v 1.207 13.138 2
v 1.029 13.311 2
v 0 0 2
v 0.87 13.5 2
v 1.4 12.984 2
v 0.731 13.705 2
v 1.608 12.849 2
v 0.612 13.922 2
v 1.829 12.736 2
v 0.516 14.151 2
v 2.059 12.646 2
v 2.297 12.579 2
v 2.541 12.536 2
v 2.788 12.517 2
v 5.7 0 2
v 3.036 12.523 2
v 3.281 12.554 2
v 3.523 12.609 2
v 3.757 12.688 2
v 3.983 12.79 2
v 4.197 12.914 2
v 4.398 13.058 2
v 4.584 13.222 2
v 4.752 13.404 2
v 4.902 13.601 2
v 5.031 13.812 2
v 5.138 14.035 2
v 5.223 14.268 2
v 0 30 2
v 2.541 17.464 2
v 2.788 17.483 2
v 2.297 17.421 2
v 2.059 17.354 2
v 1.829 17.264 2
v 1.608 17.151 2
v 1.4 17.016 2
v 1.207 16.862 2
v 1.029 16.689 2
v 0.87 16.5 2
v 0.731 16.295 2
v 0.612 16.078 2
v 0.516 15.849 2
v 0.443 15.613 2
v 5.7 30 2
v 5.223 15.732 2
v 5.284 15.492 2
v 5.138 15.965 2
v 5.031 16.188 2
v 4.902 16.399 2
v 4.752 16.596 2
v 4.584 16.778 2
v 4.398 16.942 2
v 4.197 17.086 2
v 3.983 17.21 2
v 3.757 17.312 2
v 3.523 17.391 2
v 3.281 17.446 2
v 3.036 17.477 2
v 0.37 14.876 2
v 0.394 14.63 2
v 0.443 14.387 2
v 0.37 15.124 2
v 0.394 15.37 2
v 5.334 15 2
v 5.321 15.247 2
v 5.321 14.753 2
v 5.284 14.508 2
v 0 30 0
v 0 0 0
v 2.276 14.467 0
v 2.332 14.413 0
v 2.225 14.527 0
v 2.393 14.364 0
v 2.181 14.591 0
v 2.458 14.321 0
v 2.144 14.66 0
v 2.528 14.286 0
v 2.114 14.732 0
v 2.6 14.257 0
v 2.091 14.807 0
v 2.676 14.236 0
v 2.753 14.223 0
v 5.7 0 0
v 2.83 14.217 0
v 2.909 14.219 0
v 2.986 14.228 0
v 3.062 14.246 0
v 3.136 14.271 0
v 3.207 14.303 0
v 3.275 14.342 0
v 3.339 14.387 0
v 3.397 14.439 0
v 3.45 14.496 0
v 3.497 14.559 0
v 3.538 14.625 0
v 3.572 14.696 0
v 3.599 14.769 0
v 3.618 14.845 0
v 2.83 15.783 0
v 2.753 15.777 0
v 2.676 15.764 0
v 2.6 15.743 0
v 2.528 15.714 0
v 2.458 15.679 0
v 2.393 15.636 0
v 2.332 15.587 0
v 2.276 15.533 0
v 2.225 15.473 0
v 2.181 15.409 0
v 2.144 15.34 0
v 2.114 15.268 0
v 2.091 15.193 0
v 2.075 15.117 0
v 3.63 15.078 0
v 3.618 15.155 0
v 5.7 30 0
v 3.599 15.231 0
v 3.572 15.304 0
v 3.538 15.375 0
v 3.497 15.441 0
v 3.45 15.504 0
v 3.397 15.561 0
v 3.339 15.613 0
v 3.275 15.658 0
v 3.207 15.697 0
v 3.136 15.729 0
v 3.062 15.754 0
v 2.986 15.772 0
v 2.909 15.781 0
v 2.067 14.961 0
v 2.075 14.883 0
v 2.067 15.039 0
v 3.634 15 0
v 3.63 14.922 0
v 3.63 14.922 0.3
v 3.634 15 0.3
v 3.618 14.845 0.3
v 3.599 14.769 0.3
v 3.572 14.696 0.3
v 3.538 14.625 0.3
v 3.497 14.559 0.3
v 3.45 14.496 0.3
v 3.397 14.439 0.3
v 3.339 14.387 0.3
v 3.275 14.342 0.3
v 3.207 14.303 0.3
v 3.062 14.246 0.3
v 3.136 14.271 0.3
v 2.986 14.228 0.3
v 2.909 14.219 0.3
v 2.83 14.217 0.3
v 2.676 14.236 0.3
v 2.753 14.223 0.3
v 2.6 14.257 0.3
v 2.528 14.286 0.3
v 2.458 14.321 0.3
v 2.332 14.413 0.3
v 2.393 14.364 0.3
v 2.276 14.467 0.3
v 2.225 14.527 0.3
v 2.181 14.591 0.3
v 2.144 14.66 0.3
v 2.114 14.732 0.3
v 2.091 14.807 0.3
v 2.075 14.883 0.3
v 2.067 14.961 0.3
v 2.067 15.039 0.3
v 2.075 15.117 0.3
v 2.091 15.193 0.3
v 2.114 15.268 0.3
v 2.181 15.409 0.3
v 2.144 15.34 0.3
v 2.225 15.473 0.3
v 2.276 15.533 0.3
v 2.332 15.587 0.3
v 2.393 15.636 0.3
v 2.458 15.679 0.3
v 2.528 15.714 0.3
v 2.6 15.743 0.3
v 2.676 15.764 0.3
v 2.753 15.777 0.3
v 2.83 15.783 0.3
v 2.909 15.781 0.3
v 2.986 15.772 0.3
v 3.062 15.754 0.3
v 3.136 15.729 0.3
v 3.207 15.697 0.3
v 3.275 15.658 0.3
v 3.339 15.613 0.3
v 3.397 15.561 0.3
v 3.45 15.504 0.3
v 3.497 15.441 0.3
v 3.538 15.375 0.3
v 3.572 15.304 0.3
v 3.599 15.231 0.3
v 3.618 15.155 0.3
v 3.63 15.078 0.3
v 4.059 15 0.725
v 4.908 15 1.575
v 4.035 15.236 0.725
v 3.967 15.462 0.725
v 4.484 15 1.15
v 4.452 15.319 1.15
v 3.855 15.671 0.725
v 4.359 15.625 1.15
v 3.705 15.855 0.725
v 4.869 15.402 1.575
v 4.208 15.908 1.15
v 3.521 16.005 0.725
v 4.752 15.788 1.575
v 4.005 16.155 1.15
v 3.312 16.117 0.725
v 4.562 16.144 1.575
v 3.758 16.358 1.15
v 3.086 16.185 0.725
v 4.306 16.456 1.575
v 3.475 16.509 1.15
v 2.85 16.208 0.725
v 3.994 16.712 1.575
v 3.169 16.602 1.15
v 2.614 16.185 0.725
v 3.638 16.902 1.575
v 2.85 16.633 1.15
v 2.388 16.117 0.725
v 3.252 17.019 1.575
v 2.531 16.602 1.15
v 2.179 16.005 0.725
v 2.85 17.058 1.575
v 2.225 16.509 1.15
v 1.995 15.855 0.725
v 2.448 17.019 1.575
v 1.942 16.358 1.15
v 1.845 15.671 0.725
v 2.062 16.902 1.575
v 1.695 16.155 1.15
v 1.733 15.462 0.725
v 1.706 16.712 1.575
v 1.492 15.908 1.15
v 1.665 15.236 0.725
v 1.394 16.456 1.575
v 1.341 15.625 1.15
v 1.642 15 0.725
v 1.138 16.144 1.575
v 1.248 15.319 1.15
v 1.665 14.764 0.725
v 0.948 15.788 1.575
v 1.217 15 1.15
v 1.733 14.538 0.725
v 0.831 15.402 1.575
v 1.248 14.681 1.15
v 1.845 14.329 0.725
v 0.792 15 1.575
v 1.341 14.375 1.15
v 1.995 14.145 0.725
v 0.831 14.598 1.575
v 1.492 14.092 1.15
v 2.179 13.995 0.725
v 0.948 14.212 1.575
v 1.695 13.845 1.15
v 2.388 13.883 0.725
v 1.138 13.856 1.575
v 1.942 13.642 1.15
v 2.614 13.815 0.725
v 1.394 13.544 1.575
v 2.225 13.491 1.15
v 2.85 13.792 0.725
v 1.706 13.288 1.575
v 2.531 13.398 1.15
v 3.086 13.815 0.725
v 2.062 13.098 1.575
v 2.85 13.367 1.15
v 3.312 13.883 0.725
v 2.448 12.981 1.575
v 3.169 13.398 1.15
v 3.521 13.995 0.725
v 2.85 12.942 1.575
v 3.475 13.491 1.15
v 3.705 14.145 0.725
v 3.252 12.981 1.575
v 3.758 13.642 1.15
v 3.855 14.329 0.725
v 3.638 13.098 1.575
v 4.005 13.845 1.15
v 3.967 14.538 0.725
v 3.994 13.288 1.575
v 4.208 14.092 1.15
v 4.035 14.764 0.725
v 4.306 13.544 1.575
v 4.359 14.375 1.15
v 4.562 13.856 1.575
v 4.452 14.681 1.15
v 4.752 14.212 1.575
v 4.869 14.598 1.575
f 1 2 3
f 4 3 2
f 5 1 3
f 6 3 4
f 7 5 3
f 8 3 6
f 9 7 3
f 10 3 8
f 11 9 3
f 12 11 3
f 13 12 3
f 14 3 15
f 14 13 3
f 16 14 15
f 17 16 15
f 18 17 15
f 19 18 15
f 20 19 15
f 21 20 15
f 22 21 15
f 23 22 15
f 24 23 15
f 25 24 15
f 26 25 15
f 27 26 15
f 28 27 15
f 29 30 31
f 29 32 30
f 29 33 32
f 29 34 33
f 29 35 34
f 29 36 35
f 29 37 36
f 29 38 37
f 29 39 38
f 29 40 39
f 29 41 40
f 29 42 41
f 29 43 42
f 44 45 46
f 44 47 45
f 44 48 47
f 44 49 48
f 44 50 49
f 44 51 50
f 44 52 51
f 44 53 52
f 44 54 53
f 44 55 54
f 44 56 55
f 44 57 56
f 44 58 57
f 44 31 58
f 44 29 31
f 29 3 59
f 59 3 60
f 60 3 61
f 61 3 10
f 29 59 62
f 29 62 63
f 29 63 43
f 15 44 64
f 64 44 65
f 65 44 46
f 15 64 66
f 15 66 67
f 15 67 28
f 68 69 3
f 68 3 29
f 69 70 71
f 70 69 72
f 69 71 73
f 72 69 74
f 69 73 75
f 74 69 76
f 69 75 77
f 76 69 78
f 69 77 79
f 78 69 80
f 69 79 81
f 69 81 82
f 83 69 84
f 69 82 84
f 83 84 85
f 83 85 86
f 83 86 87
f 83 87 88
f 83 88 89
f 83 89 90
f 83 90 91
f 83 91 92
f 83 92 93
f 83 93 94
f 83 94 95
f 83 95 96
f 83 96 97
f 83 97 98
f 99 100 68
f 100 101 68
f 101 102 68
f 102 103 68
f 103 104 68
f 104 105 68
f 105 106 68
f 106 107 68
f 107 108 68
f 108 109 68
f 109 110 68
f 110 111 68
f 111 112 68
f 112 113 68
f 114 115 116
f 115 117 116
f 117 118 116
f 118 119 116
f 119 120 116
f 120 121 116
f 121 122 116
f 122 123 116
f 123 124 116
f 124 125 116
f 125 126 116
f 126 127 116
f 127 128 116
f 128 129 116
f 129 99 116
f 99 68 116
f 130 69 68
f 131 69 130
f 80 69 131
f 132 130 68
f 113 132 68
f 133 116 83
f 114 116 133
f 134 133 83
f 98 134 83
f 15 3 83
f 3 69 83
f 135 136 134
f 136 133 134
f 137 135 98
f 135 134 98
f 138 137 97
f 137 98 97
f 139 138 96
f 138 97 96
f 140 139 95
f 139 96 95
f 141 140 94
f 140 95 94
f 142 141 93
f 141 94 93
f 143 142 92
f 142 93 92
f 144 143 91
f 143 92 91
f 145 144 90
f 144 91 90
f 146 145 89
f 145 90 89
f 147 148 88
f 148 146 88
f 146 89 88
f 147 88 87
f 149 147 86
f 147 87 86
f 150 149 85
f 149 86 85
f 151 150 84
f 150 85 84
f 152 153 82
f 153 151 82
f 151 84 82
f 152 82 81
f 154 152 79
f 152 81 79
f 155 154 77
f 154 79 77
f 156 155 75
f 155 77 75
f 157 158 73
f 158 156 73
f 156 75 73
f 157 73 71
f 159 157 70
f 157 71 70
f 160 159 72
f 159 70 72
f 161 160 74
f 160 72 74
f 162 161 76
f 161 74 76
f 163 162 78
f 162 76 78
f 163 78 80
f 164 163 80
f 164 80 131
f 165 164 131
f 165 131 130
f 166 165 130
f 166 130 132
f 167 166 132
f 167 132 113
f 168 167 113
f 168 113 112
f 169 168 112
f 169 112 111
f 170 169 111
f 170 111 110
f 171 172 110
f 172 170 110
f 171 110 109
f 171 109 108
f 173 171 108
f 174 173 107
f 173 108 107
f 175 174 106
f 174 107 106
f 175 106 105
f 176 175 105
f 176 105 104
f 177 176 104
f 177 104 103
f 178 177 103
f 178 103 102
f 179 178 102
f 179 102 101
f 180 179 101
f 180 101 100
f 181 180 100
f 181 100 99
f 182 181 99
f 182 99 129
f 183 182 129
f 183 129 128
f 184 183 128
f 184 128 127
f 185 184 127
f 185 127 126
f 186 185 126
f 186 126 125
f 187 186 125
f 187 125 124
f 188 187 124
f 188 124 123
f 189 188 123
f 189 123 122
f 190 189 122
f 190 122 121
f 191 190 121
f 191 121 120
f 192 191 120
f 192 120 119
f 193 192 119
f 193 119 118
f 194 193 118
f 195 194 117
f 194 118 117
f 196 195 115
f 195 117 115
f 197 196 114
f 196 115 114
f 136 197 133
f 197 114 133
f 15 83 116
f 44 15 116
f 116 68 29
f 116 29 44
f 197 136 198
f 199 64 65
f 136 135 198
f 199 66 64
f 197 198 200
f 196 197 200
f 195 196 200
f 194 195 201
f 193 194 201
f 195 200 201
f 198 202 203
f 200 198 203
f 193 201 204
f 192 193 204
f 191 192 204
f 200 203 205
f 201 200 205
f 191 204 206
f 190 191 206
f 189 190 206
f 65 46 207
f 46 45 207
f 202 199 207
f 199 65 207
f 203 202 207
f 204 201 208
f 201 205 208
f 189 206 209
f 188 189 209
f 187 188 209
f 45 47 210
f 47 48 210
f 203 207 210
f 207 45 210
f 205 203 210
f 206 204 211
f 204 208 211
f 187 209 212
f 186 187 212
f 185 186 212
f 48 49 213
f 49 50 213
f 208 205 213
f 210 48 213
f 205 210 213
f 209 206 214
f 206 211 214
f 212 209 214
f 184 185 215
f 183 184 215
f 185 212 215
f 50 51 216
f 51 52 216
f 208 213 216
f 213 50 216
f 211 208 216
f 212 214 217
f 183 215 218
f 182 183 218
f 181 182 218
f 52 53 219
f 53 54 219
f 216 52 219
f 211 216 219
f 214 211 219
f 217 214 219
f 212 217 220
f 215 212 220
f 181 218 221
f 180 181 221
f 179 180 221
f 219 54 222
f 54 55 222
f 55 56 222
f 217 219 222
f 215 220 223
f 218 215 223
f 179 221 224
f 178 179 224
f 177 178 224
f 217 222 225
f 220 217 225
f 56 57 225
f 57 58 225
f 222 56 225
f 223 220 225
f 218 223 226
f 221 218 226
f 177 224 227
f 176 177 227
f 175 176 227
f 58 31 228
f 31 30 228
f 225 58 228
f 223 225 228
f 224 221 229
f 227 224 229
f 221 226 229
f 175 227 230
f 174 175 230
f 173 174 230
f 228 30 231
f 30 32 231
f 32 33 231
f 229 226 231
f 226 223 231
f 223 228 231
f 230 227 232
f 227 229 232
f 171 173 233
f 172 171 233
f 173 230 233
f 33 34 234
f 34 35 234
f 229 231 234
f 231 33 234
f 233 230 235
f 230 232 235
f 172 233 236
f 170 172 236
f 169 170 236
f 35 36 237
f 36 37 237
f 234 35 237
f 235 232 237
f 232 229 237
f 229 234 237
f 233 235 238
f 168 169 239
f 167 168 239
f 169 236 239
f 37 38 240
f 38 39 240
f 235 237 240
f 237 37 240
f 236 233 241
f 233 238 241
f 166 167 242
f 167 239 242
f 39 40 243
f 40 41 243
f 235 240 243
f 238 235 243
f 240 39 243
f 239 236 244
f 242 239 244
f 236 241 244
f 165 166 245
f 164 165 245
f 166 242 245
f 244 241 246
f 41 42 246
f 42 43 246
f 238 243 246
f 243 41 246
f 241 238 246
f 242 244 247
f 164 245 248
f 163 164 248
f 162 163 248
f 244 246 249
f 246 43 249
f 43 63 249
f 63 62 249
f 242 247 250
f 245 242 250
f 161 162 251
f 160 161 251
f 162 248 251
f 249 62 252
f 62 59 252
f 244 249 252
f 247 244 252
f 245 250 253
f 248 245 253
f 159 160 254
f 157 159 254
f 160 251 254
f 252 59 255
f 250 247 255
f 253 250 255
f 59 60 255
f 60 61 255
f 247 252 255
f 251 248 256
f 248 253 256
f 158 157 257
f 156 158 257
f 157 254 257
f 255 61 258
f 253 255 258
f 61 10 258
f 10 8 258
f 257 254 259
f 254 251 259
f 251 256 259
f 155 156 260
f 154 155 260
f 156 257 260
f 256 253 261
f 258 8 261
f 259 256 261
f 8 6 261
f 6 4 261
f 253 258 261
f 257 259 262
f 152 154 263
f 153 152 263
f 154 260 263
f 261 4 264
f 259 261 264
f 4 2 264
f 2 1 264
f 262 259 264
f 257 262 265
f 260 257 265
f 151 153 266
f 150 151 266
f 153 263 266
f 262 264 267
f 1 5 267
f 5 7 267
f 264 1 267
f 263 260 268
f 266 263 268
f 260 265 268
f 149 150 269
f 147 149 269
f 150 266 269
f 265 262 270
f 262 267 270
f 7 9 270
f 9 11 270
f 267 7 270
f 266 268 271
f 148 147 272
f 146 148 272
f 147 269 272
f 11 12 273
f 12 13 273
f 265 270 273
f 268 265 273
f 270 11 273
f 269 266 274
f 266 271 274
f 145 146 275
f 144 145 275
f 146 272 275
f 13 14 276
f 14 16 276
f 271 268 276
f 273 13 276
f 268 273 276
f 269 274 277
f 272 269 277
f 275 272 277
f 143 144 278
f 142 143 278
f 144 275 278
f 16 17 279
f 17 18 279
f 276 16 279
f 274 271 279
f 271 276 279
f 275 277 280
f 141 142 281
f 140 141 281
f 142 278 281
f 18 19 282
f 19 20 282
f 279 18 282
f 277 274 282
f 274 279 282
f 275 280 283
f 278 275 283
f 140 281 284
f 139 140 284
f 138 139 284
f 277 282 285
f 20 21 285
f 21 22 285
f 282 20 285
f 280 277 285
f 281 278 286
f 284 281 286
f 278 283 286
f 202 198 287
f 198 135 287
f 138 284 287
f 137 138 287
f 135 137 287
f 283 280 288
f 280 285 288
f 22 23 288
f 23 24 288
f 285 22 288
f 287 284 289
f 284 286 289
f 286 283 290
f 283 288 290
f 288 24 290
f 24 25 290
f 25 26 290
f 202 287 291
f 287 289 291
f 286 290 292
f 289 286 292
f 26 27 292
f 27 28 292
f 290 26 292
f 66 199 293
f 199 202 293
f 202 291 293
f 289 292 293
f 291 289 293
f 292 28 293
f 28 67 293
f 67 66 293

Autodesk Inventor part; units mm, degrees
ref_plane "YZ Plane" through (0, 0, 0) normal (1, 0, 0) x (0, 1, 0)
ref_plane "XZ Plane" through (0, 0, 0) normal (0, 1, 0) x (-1, 0, 0)
ref_plane "XY Plane" through (0, 0, 0) normal (0, 0, 1) x (1, 0, 0)
sketch "Skizze1" plane through (0, 0, 0) normal (0, 0, 1) x (1, 0, 0)
  circle A0 centre (2.85, 15) radius 0.7835 projected
  line L0 (0, 0) -> (5.7, 0) projected
  line L1 (5.7, 0) -> (5.7, 30) projected
  line L2 (0, 30) -> (5.7, 30) projected
  line L3 (0, 0) -> (0, 30) projected
extrude "Extrusion1" add sketch "Skizze1" along normal blind 2
chamfer "Fasen1" distance 1.7 angle 45 1 edges at (2.0665, 15, 2)
properties part number "LagerHH" material "Polyethylen, hohe Dichte, Gleitfläche"
